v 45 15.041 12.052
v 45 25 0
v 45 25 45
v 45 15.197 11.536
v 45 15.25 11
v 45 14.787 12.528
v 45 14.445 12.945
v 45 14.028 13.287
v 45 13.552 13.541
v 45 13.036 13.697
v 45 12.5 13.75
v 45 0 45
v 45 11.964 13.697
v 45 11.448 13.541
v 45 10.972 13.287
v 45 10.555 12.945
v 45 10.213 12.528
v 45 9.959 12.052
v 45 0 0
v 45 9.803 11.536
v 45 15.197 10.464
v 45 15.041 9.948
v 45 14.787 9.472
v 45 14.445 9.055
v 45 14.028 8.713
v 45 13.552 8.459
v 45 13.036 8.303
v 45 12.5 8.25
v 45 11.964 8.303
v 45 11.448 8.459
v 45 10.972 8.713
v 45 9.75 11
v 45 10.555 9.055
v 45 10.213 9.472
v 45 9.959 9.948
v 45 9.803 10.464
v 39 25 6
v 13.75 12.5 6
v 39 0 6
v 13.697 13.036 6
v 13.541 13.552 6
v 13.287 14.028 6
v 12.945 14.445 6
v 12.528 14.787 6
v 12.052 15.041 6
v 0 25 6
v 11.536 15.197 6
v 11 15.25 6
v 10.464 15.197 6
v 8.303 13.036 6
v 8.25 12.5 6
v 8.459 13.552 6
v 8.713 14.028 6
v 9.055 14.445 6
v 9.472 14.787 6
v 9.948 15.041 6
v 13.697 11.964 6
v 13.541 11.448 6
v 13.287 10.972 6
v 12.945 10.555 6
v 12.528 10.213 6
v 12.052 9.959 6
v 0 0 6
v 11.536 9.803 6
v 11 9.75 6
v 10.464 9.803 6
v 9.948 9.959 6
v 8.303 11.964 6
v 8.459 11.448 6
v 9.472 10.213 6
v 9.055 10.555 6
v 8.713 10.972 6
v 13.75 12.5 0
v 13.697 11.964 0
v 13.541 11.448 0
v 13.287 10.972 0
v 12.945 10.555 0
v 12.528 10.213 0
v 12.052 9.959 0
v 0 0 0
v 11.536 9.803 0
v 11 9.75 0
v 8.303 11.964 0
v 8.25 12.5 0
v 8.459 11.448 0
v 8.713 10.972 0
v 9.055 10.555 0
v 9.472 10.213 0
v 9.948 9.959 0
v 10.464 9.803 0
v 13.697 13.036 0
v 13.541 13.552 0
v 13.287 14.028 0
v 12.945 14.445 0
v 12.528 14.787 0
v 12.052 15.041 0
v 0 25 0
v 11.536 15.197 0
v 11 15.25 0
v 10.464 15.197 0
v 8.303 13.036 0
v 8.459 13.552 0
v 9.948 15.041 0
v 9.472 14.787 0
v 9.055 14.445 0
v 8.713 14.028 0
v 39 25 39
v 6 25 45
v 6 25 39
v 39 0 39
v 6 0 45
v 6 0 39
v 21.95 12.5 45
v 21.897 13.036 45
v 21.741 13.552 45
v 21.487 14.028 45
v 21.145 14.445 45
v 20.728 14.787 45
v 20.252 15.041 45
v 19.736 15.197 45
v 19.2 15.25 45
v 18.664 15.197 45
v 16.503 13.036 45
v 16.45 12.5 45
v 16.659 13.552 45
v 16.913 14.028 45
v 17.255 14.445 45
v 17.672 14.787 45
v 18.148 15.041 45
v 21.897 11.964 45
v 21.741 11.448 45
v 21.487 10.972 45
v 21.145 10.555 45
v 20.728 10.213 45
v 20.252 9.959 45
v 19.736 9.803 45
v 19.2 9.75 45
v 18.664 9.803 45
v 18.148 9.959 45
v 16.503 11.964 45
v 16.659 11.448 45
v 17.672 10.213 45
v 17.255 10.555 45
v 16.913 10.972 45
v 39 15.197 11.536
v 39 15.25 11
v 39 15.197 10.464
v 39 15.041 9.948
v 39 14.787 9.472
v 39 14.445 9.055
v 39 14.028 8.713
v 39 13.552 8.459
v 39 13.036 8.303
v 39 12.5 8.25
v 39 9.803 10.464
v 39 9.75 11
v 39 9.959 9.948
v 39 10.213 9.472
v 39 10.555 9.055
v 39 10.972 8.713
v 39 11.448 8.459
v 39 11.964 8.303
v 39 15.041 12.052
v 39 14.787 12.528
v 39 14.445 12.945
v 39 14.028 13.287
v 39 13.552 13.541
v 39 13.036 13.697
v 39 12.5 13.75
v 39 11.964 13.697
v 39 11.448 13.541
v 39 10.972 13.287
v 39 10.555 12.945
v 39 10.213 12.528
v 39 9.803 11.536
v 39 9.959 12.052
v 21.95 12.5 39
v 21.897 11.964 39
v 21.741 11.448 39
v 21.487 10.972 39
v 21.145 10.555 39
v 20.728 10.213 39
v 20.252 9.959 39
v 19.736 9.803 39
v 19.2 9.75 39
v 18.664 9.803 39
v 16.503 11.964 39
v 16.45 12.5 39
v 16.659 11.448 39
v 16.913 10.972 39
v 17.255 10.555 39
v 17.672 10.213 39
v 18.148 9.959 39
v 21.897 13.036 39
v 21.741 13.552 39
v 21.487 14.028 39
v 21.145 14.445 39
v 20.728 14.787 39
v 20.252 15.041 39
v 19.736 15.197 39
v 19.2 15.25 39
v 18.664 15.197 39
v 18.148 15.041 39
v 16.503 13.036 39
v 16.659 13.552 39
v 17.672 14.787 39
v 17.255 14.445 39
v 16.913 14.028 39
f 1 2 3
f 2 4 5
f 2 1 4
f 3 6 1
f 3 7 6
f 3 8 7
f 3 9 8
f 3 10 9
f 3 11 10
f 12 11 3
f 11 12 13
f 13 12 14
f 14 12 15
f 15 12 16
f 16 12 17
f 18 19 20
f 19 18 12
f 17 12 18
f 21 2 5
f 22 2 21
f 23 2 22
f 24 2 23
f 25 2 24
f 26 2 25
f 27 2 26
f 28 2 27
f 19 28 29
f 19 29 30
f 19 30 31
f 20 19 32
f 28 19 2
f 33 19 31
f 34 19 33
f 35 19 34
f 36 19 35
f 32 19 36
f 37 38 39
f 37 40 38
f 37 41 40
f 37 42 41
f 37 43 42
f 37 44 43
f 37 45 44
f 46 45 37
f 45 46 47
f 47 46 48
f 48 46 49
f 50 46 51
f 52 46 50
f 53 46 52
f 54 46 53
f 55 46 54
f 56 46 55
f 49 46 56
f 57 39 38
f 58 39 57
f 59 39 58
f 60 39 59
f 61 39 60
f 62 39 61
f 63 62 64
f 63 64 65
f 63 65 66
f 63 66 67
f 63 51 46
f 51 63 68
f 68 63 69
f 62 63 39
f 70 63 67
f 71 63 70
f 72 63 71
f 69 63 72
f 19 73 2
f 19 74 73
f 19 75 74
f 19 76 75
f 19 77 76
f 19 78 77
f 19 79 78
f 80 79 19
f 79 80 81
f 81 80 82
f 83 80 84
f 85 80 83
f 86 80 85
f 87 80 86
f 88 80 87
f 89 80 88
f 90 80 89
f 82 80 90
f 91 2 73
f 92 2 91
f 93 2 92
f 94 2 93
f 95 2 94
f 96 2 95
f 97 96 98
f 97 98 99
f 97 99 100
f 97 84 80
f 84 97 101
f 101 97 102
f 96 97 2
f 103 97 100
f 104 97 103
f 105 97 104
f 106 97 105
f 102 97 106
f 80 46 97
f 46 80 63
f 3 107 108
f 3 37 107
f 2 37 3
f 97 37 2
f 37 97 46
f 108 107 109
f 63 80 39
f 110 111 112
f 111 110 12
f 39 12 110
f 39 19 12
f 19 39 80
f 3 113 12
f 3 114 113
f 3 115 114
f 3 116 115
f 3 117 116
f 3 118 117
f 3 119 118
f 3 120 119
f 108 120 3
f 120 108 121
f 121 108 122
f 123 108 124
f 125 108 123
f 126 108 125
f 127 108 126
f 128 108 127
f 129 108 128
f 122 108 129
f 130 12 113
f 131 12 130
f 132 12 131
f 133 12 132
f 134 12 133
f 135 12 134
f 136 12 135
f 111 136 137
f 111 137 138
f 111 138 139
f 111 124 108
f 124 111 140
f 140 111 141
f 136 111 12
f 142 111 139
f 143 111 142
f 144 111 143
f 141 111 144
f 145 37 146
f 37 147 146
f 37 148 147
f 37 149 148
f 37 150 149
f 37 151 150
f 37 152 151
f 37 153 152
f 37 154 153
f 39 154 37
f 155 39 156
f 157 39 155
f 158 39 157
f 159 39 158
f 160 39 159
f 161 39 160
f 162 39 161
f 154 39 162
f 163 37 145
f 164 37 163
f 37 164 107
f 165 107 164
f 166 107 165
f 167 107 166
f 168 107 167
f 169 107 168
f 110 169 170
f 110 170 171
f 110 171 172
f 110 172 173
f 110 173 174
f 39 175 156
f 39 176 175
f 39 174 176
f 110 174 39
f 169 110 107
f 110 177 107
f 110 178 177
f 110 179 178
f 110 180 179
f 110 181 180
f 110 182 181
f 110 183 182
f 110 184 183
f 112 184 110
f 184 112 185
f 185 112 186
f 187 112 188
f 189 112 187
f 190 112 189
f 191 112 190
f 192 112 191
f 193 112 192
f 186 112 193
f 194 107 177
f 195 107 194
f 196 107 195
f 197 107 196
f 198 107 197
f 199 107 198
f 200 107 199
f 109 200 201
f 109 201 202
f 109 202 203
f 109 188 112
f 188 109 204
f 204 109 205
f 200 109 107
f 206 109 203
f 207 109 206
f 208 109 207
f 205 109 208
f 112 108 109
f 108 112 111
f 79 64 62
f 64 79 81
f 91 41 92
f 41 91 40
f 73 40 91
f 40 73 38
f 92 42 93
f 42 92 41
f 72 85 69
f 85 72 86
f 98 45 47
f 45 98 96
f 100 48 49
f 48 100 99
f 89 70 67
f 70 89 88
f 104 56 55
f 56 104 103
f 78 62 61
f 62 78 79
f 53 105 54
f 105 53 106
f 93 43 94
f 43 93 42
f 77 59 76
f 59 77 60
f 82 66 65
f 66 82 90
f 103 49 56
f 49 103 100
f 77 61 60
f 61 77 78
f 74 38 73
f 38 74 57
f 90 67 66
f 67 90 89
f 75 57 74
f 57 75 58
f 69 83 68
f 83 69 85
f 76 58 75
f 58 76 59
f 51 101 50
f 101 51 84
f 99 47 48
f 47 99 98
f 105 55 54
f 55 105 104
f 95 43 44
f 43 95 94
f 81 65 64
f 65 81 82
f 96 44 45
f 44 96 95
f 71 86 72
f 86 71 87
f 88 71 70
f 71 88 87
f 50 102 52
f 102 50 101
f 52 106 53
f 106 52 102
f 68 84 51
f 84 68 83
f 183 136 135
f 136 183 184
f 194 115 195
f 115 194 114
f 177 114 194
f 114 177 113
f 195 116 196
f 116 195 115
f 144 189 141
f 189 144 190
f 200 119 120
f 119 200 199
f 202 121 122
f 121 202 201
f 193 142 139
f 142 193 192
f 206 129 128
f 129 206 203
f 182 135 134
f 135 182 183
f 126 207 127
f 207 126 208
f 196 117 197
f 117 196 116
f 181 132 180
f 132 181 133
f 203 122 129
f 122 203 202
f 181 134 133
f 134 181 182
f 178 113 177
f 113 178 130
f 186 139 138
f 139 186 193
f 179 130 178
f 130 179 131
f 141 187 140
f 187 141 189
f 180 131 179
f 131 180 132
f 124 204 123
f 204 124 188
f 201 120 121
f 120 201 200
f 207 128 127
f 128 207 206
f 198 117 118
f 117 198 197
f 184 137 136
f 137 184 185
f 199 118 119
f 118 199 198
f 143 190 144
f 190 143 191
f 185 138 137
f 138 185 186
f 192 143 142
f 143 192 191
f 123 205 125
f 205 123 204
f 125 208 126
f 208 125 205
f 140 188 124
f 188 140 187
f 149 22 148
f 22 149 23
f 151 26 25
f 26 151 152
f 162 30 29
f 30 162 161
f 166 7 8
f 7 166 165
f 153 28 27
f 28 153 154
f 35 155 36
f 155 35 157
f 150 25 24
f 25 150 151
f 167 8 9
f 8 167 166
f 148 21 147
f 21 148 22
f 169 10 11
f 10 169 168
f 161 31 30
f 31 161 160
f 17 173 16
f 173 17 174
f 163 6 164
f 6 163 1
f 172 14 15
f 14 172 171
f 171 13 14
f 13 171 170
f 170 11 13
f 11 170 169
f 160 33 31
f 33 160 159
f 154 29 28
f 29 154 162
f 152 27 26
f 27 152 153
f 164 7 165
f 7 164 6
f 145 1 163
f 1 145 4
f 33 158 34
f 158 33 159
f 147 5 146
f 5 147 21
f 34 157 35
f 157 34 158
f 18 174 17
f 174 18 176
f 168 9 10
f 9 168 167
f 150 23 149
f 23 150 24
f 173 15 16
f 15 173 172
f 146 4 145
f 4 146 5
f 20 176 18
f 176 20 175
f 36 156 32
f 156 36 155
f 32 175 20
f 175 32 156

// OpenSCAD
$fn = 32;

// ----------------------------------------------------------------------
// Z-bracket: 45 x 25 x 45 mm
// ----------------------------------------------------------------------

// --- parameters (mm) ---
lower_leg = 45;           // lower foot length, X
upper_leg = 33;           // upper foot length, X
bracket_w = 25;           // bracket width, Y
offset_h = 45;            // overall rise, Z
sheet_t = 6;              // plate thickness
hole_d = 5.5;             // clearance for M5

module hole_z(px, py, z0) {
  translate([px, py, z0 - 0.5]) cylinder(h = sheet_t + 1, d = hole_d);
}
module hole_x(py, pz) {
  translate([-0.5, py, pz]) rotate([0, 90, 0]) cylinder(h = sheet_t + 1, d = hole_d);
}

difference() {
  union() {
    cube([lower_leg, bracket_w, sheet_t]);
    /* web, overlapping the lower foot */
    translate([lower_leg - sheet_t, 0, 0]) cube([sheet_t, bracket_w, offset_h]);
    /* upper foot, sunk into the web */
    translate([lower_leg - sheet_t - upper_leg, 0, offset_h - sheet_t]) cube([upper_leg + sheet_t, bracket_w, sheet_t]);
  }
  hole_z(11, 12.5, 0);
  translate([lower_leg - sheet_t - 19.8, 0, 0]) hole_z(0, 12.5, offset_h - sheet_t);
  translate([lower_leg - sheet_t, 0, 0]) hole_x(12.5, 11);
}
